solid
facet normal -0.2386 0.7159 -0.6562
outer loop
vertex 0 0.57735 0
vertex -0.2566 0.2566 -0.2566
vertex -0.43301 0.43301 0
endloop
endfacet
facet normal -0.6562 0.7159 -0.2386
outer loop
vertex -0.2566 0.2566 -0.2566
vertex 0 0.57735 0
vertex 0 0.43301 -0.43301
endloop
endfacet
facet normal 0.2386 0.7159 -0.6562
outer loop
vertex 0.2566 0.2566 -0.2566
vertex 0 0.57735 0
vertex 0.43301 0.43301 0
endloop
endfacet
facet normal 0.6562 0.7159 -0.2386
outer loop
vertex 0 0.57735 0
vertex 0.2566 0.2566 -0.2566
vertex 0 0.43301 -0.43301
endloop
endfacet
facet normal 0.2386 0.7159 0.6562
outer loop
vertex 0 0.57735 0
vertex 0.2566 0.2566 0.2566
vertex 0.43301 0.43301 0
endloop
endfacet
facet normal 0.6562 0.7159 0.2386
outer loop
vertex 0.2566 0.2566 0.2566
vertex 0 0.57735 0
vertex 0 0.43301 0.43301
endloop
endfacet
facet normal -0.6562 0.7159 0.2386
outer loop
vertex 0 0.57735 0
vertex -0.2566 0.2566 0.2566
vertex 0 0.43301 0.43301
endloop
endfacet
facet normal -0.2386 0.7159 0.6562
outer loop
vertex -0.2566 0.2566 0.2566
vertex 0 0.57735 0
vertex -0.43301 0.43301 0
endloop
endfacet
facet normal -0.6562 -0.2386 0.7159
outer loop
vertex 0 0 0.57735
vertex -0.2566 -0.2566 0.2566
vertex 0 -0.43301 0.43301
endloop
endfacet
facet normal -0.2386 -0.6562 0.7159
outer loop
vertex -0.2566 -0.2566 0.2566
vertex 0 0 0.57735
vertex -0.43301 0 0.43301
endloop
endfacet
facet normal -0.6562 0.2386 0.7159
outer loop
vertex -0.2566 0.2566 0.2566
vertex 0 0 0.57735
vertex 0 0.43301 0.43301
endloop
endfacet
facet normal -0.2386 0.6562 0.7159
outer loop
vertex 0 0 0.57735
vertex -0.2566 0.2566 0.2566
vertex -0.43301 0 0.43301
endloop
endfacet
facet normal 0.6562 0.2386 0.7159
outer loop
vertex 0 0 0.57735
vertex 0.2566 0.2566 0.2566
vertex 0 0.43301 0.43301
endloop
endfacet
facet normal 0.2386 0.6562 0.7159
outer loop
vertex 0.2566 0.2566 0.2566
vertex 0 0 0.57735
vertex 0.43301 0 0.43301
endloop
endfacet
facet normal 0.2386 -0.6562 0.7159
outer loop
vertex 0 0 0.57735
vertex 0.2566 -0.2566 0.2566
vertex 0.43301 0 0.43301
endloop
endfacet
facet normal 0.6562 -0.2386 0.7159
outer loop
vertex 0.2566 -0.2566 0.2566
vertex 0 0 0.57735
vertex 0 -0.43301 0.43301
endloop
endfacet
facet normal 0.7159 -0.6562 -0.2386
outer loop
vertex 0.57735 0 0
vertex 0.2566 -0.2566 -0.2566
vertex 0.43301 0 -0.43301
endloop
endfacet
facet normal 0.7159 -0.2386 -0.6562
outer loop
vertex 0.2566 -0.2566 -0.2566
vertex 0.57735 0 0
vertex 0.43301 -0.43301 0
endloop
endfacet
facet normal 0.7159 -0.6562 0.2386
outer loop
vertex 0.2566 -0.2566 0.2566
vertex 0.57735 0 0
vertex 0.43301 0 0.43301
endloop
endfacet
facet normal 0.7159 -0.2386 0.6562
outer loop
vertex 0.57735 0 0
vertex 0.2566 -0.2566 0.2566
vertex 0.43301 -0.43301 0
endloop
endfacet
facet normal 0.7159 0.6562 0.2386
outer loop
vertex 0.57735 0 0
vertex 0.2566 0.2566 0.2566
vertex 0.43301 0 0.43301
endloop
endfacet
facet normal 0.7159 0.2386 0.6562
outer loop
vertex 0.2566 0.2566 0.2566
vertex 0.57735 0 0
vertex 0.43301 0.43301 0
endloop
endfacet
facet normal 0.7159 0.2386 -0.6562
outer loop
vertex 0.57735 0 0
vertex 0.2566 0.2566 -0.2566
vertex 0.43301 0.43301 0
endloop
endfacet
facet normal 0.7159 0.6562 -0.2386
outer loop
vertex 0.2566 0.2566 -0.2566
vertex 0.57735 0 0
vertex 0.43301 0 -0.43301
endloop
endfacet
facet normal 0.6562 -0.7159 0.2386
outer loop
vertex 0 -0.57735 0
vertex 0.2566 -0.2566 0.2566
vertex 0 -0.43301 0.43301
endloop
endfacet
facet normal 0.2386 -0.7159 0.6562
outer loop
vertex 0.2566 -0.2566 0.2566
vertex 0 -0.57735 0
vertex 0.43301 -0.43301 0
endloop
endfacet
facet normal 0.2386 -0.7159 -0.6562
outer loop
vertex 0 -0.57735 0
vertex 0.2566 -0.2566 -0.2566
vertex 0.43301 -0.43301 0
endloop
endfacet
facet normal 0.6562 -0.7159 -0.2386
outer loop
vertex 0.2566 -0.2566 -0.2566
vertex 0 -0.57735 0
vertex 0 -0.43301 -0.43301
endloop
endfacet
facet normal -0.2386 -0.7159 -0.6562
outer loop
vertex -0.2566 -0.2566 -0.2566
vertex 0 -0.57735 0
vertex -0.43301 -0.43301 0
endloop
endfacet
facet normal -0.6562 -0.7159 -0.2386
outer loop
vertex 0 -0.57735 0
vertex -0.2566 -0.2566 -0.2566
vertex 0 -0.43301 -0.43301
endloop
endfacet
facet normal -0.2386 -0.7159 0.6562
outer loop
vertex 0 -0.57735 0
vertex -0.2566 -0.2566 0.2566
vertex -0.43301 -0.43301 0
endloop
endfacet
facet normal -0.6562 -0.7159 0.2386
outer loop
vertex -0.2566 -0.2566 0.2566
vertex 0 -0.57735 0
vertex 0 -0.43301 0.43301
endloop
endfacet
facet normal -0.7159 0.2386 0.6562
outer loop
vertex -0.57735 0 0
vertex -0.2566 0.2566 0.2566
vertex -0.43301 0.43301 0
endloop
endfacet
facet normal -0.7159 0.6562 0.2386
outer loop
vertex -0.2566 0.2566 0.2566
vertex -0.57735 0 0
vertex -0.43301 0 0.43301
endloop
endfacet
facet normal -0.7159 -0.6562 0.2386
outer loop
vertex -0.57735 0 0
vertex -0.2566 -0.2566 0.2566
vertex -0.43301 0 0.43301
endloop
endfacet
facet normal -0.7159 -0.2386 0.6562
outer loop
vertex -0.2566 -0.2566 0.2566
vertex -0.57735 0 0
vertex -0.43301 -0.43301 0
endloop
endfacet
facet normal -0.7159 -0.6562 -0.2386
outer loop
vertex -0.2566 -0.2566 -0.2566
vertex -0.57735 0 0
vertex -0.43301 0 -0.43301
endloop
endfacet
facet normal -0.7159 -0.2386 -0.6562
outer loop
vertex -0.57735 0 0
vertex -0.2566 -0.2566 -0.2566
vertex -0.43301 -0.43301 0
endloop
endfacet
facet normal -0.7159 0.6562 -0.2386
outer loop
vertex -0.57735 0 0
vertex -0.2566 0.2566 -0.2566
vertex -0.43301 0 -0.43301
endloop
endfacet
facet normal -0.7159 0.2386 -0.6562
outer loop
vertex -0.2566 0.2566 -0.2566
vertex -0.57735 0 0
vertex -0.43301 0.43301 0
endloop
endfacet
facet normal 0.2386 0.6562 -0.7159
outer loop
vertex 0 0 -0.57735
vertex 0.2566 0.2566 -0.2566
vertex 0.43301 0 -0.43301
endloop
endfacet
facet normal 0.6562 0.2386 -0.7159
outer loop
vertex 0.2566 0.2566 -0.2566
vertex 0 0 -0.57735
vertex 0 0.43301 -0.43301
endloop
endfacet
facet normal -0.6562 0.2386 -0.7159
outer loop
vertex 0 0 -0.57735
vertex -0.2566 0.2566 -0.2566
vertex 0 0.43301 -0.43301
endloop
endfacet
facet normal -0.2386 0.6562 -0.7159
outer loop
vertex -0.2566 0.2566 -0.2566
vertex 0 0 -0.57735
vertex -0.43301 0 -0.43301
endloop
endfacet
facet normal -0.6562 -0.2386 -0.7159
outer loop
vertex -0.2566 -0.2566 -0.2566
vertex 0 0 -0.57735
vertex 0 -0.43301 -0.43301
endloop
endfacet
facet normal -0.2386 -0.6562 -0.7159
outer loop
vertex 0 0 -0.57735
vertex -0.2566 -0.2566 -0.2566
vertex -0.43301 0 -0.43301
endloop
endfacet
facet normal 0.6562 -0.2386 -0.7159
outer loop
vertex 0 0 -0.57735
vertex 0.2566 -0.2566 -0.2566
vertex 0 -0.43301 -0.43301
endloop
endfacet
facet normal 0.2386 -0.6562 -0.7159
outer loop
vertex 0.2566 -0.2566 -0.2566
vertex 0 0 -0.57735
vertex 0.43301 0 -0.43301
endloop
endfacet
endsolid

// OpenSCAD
function C() = 
   p_resize(poly(name= "C",
       vertices= [
[ 0.5,  0.5,  0.5],
[ 0.5,  0.5, -0.5],
[ 0.5, -0.5,  0.5],
[ 0.5, -0.5, -0.5],
[-0.5,  0.5,  0.5],
[-0.5,  0.5, -0.5],
[-0.5, -0.5,  0.5],
[-0.5, -0.5, -0.5]],
      faces=
 [
[ 4 , 5, 1, 0],
[ 2 , 6, 4, 0],
[ 1 , 3, 2, 0],
[ 6 , 2, 3, 7],
[ 5 , 4, 6, 7],
[ 3 , 1, 5, 7]]
   ));
       
function flatten(l) = [ for (a = l) for (b = a) b ] ;
function reverse(l) = 
     [for (i=[1:len(l)]) l[len(l)-i]];
function vadd(points,v,i=0) =
      i < len(points)
        ?  concat([points[i] + v], vadd(points,v,i+1))
        :  [];
//
function vsum(points,i=0) =  
      i < len(points)
        ?  (points[i] + vsum(points,i+1))
        :  [0,0,0];
function ssum(list,i=0) =  
      i < len(list)
        ?  (list[i] + ssum(list,i+1))
        :  0;
//
function vcontains(val,list) =
     search([val],list)[0] != [];
function as_points(indexes,points) =
    [for (i=[0:len(indexes)-1])
          points[indexes[i]]
    ]; 
//
function centroid(points) = 
      vsum(points) / len(points);
//    
function vnorm(points) =
     [for (p=points) norm(p)];
//      
function average_norm(points) =
       ssum(vnorm(points)) / len(points);
function vertex_faces(v,faces) =   // return the faces containing v
     [ for (f=faces) if(v!=[] && search(v,f)) f ];
//    
//function ordered_vertex_faces(v,vfaces,cface=[],k=0)  =
//   k==0
//       ? let (nface=vfaces[0])
//           concat([nface],ordered_vertex_faces(v,vfaces,nface,k+1))
//       : k < len(vfaces)
//           ?  let(i = index_of(v,cface))
//              let(j= (i-1+len(cface))%len(cface))
//              let(edge=[v,cface[j]])
//              let(nface=face_with_edge(edge,vfaces))
//                 concat([nface],ordered_vertex_faces(v,vfaces,nface,k+1 ))  
//           : []
//;       
//      
//function ordered_vertex_edges(v,vfaces,face,k=0)  =
//   let(cface=(k==0)? vfaces[0] : face)
//   k < len(vfaces)
//           ?  let(i = index_of(v,cface))
//              let(j= (i-1+len(cface))%len(cface))
//              let(edge=[v,cface[j]])
//              let(nface=face_with_edge(edge,vfaces))
//                 concat([edge],ordered_vertex_edges(v,vfaces,nface,k+1 ))  
//           : []
//;     
//     
function vertex_edges(v,edges) = // return the ordered edges containing v
      [for (e = edges) if(e[0]==v || e[1]==v) e];
//                       
//// edge functions
//          
function distinct_edge(e) = 
     e[0]< e[1]
           ? e
           : reverse(e);
//          
function ordered_face_edges(f) =
 // edges are ordered anticlockwise
    [for (j=[0:len(f)-1])
        [f[j],f[(j+1)%len(f)]]
    ];
//
//function all_edges(faces) =
//   [for (f = faces)
//       for (j=[0:len(f)-1])
//          let(p=f[j],q=f[(j+1)%len(f)])
//             [p,q] 
//   ];
//
function distinct_face_edges(f) =
    [for (j=[0:len(f)-1])
       let(p=f[j],q=f[(j+1)%len(f)])
          distinct_edge([p,q])
    ];
//    
function distinct_edges(faces) =
   [for (f = faces)
       for (j=[0:len(f)-1])
          let(p=f[j],q=f[(j+1)%len(f)])
             if(p<q) [p,q]  // no duplicates
   ];
      
//function check_euler(obj) =
//     //  E = V + F -2    
//    len(p_vertices(obj)) + len(p_faces(obj)) - 2
//           ==  len(distinct_edges(obj[2]));
//
//function edge_length(edge,points) =    
//    let (points = as_points(edge,points))
//    norm(points[0]-points[1]) ;
//             
//function edge_lengths(edges,points) =
//   [ for (edge = edges) 
//     edge_length(edge,points)
//   ];
// 
//function tangent(v1,v2) =
//   let (d=v2-v1)
//   v1 - d * (d*v1)/(d*d);
// 
//function edge_distance(v1,v2) = norm(tangent(v1,v2));
// 
function face_with_edge(edge,faces) =
     flatten(
        [for (f = faces) 
           if (vcontains(edge,ordered_face_edges(f)))
            f
        ]);
//           
//function dihedral_angle(edge,faces,points)=
//    let(f0 = face_with_edge(edge,faces),
//        f1 = face_with_edge(reverse(edge),faces)
//        )
//    let(angle = 
//           angle_between(
//               normal(as_points(f0,points)),
//               normal(as_points(f1,points))))
//    180-angle;     
//
//function dihedral_angle_faces(f0,f1,faces,points)=
//    let(angle = 
//           angle_between(
//               normal(as_points(faces[f0],points)),
//               normal(as_points(faces[f1],points))))
//    180-angle; 
//           
////face functions
//function selected_face(face,fn) = 
//     fn == [] || search(len(face),fn) != [] ;
//
//function orthogonal(v0,v1,v2) =  cross(v1-v0,v2-v1);
//
//function normal(face) =
//     let (n=orthogonal(face[0],face[1],face[2]))
//     - n / norm(n);
//
//function triangle(a,b) = norm(cross(a,b))/2;
//
//function face_area(face) =
//     ssum([for (i=[0:len(face)-1])
//           triangle(face[i], face[(i+1)%len(face)]) ]);
//     
//function face_areas(obj) =
//   [for (f=p_faces(obj))
//       let(face_points = as_points(f,p_vertices(obj)))
//       let(centroid=centroid(face_points))
//          face_area(vadd(face_points,-centroid))
//   ];
//
//function face_areas_index(obj) =
//   [for (face=p_faces(obj))
//       let(face_points = as_points(face,p_vertices(obj)))
//       let(centroid=centroid(face_points))
//          [face,face_area(vadd(face_points,-centroid))]
//   ];
//
//function max_area(areas, max=[undef,0], i=0) =
//   i <len(areas)
//      ? areas[i][1] > max[1]
//         ?  max_area(areas,areas[i],i+1)
//         :  max_area(areas,max,i+1)
//      : max[0];
//
//function average_face_normal(fp) =
//     let(fl=len(fp))
//     let(normals=
//           [for(i=[0:fl-1])
//            orthogonal(fp[i],fp[(i+1)%fl],fp[(i+2)%fl])
//           ]
//          )
//     vsum(normals)/len(normals);
//    
//function average_normal(fp) =
//     let(fl=len(fp))
//     let(unitns=
//           [for(i=[0:fl-1])
//            let(n=orthogonal(fp[i],fp[(i+1)%fl],fp[(i+2)%fl]))
//            let(normn=norm(n))
//              normn==0 ? [] : n/normn
//           ]
//          )
//     vsum(unitns)/len(unitns);
//     
//function average_edge_distance(fp) =
//     let(fl=len(fp))
//     ssum( [for (i=[0:fl-1])
//                edge_distance(fp[i],fp[(i+1)%fl])
//             ])/ fl;
//    
//function face_sides(faces) =
//    [for (f=faces) len(f)];
//        
//function face_coplanarity(face) =
//       norm(cross(cross(face[1]-face[0],face[2]-face[1]),
//                  cross(face[2]-face[1],face[3]-face[2])
//            ));
//
//
//function face_edges(face,points) =
//     [for (edge=ordered_face_edges(face)) 
//           edge_length(edge,points)
//     ];
//         
//function min_edge_length(face,points) =
//    min(face_edges(face,points));
//   
//function face_irregularity(face,points) =
//    let (lengths=face_edges(face,points))
//    max(lengths)/ min(lengths);
//
//function face_analysis(faces) =
//  let (edge_counts=face_sides(faces))
//  [for (sides=distinct(edge_counts))
//        [sides,count(sides,edge_counts)]
//   ];
//
//function vertex_face_list(vertices,faces) =
//    [for (i=[0:len(vertices)-1])
//     let (vf= vertex_faces(i,faces))
//     len(vf)];
//    
//function vertex_analysis(vertices,faces) =
//  let (face_counts=vertex_face_list(vertices,faces))
//  [for (vo = distinct(face_counts))
//        [vo,count(vo,face_counts)]
//   ];
//// ensure that all faces have a lhs orientation
//function cosine_between(u, v) =(u * v) / (norm(u) * norm(v));
//
//function lhs_faces(faces,vertices) =
//    [for (face = faces)
//     let(points = as_points(face,vertices))
//        cosine_between(normal(points), centroid(points)) < 0
//        ?  reverse(face)  :  face
//    ];
//  
//// poly functions
////  constructor
function poly(name,vertices,faces,debug=[],partial=false) = 
    [name,vertices,faces,debug,partial];
//    
//// accessors
function p_name(obj) = obj[0];
function p_vertices(obj) = obj[1];
function p_faces(obj) = obj[2];
//function p_debug(obj)=obj[3];
function p_partial(obj)=obj[4];
function p_edges(obj) = 
       p_partial(obj)
           ? all_edges(p_faces(obj))
           : distinct_edges(p_faces(obj));
function p_faces_as_points(obj) =
    [for (f = p_faces(obj))
        as_points(f,p_vertices(obj))
    ];
//    
module p_render(obj,show_vertices=false,show_edges=false,show_faces=true, rv=0.04, re=0.02) {
     if(show_faces) 
          polyhedron(p_vertices(obj),p_faces(obj),convexity=10);
     if(show_vertices) 
         show_points(p_vertices(obj),rv);
     if(show_edges)
       show_edges(p_edges(obj),p_vertices(obj),re);
};
function centroid_points(points) = 
     vadd(points, - centroid(points));
function p_circumscribed_resize(obj,radius=1) =
    let(pv=centroid_points(p_vertices(obj)))
    let(average=average_norm(pv))
    poly(name=p_name(obj),
         vertices=pv * radius /average,
         faces=p_faces(obj),
         debug=average
    );
// 
function p_resize(obj,radius=1) =
    p_circumscribed_resize(obj,radius);
//
//// canonicalization
//// Conway operators 
///*  where necessary, new vertices are first created and stored in an associative array, keyed by whatever is appropriate to identify the new vertex - this could be an old vertex id, a face, an edge or something more complicated.  This array is then used to create an associative array of key and vertex ids for use in face construction, and to generate the new vertices themselves. 
//*/
//
function vertex_ids(entries,offset=0,i=0) = 
// to get position of new vertices 
    len(entries) > 0
          ?[for (i=[0:len(entries)-1]) 
             [entries[i][0] ,i+offset]
           ]
          :[]
          ;
//   
function vertex_values(entries)= 
    [for (e = entries) e[1]];
// 
function vertex(key,entries) =   // key is an array 
    entries[search([key],entries)[0]][1];
//    
function cc(obj) =
// Catmull-Clark smoothing
// each face is replaced with n quadralaterals based on edge midpoints vertices and centroid
// edge midpoints are average of edge endpoints and adjacent centroids
// original vertices replaced by weighted average of original vertex, face centroids and edge midpoints

    let(pe=p_edges(obj),
        pf=p_faces(obj),
        pv=p_vertices(obj))
    let (newfv =
           [for (face = pf)               // new centroid vertices
            let (fp=as_points(face,pv))
             [face,centroid(fp)]                                
           ])
    let (newev =                          // new edge 'midpoints'
           [for (edge=pe)
            let (ep = as_points(edge,pv),
                 af1 = face_with_edge(edge,pf),
                 af2 = face_with_edge(reverse(edge),pf),
                 fc1 = vertex(af1, newfv),
                 fc2 = vertex(af2, newfv))
             [edge,(ep[0]+ep[1]+fc1+fc2)/4]
           ])
     let(newfvids=vertex_ids(newfv,len(pv)))
     let(newevids=vertex_ids(newev,len(pv)+len(newfv)))
         
     let(newf =
          flatten(
          [for (face=pf) 
             let(centroid=vertex(face,newfvids))  
             flatten(
              [for (j=[0:len(face)-1])    //  
               let (a=face[j],
                    b=face[(j+1)%len(face)],
                    c=face[(j+2)%len(face)],
                    mid1=vertex(distinct_edge([a,b]),newevids),
                    mid2=vertex(distinct_edge([b,c]),newevids)         
              )
                   [[ centroid, mid1,b,mid2]]
              ])
           ]))   
     let(newv =                       // revised original vertices 
         [ for (i = [0:len(pv)-1])
           let (v = pv[i],
                vf = [for (face = vertex_faces(i,pf)) vertex(face,newfv)],
                F = centroid(vf),
                R = centroid([for (edge = vertex_edges(i,pe)) vertex(edge,newev)]),
                n = len(vf))
           ( F + 2* R + (n  - 3 )* v ) / n
         ])         
     poly(name=str("v",p_name(obj)),
          vertices= concat(newv,vertex_values(newfv),vertex_values(newev)),                
          faces=newf
      ) 
 ; //end cc
//
//function rcc(s,n=0) =
//// multilevel Catmull-Clark
//    n == 0
//         ? s
//         : rcc(cc(s),n-1)
//;            
//                                 
//function place(obj,face_i) =
//// on largest face for printing
//   let (face= face_i == undef ? max_area(face_areas_index(obj)) : p_faces(obj)[face_i])
//   let (points =as_points(face,p_vertices(obj)))
//   let (n = normal(points), c=centroid(points))
//   let (m=m_from(c,-n))
//   transform(obj,m)
//;
//
//function orient(obj) =
//// ensure faces have lhs order
//    poly(name=str("O",p_name(obj)),
//         vertices= p_vertices(obj),
//         faces = lhs_faces(p_faces(obj),p_vertices(obj))
//    );
// 
//function invert(obj,p) =
//// invert vertices 
//    poly(name=str("I",p_name(obj)),
//         vertices= 
//            [ for (v =p_vertices(obj))
//              let (n=norm(v))
//              v /  pow(n,p)  
//            ],
//         faces = p_faces(obj)
//    );
//
//function shell(obj,outer_inset_ratio=0.2, outer_inset, inner_inset_ratio, inner_inset,thickness=0.2,fn=[],min_edge_length=0.01,nocut=0) = 
//// upper and lower inset can be specified by ratio or absolute distance
//   let(inner_inset_ratio= inner_inset_ratio == undef ? outer_inset_ratio : inner_inset_ratio,
//       pf=p_faces(obj),           
//       pv=p_vertices(obj))
//   let(inv=   // corresponding points on inner surface
//       [for (i =[0:len(pv)-1])
//        let(v = pv[i])
//        let(norms =
//            [for (f=vertex_faces(i,pf))
//             let (fp=as_points(f,pv))
//                normal(fp)
//            ])
//        let(av_norm = -vsum(norms)/len(norms))
//            v + thickness*unitv(av_norm)
//        ])
//                 
//   let (newv =   
// // the inset points on outer and inner surfaces
// // outer inset points keyed by face, v, inner points by face,-v-1
//         flatten(
//           [ for (face = pf)
//             if(selected_face(face,fn)
//                && min_edge_length(face,pv) > min_edge_length)
//                 let(fp=as_points(face,pv),
//                     ofp=as_points(face,inv),
//                     c=centroid(fp),
//                     oc=centroid(ofp))
//                 flatten(
//                    [for (i=[0:len(face)-1])
//                     let(v=face[i],
//                         p = fp[i],
//                         p1= fp[(i+1)%len(face)],
//                         p0=fp[(i-1 + len(face))%len(face)],
//                         sa = angle_between(p0-p,p1-p),
//                         bv = (unitv(p1-p)+unitv(p0-p))/2,
//                         op= ofp[i],
//                         ip = outer_inset ==  undef 
//                             ? p + (c-p)*outer_inset_ratio 
//                             : p + outer_inset/sin(sa) * bv ,
//                         oip = inner_inset == undef 
//                             ? op + (oc-op)*inner_inset_ratio 
//                             : op + inner_inset/sin(sa) * bv)
//                     [ [[face,v],ip],[[face,-v-1],oip]]
//                    ])
//             ])          
//           )
//   let(newids=vertex_ids(newv,2*len(pv)))
//   let(newf =
//         flatten(
//          [ for (i = [0:len(pf)-1])   
//            let(face = pf[i])
//            flatten(
//              selected_face(face,fn)
//                && min_edge_length(face,pv) > min_edge_length
//                && i  >= nocut    
//              
//                ? [for (j=[0:len(face)-1])   //  replace N-face with 3*N quads 
//                  let (a=face[j],
//                       inseta = vertex([face,a],newids),
//                       oinseta= vertex([face,-a-1],newids),
//                       b=face[(j+1)%len(face)],
//                       insetb= vertex([face,b],newids),
//                       oinsetb=vertex([face,-b-1],newids),
//                       oa=len(pv) + a,
//                       ob=len(pv) + b) 
//                  
//                     [
//                       [a,b,insetb,inseta]  // outer face
//                      ,[inseta,insetb,oinsetb,oinseta]  //wall
//                      ,[oa,oinseta,oinsetb,ob]  // inner face
//                     ] 
//                   ] 
//                :  [[face],  //outer face
//                    [reverse([  //inner face
//                           for (j=[0:len(face)-1])
//                           len(pv) +face[j]
//                         ])
//                    ]
//                   ]    
//               )
//         ] ))    
//                           
//   poly(name=str("S",p_name(obj)),
//       vertices=  concat(pv, inv, vertex_values(newv)) ,    
//       faces= newf,
//       debug=newv       
//       )
//; // end shell  
//

//   
//
//// modulation  
//                           
//function modulate_points(points) =
//   [for(p=points)
//       let(s=xyz_to_spherical(p),
//           fs=fmod(s[0],s[1],s[2]))
//       spherical_to_xyz(fs[0],fs[1],fs[2])
//   ];
//
//function xyz_to_spherical(p) =
//    [ norm(p), acos(p.z/ norm(p)), atan2(p.x,p.y)] ;
//
//function spherical_to_xyz(r,theta,phi) =
//    [ r * sin(theta) * cos(phi),
//      r * sin(theta) * sin(phi),
//      r * cos(theta)];
//
//function fstar(r,theta,phi)=
//      [r*(1.0 + 0.5*pow((cos(3*phi)),2)), theta ,phi];  
//   
//function fegg(r,theta,phi) = 
//     [r*(1.0+ 0.5*pow(1.1*(cos(1*theta)),3)), theta,phi];
//
//function fberry(r,theta,phi) =
//     [r*(1.0 - 0.5*pow(0.8*(cos(theta+60)),2)),theta,phi];       
//
//function fcushion(r,theta,phi) =
//     [r*(1.0 - 0.5*pow(0.9*cos(theta),2)), theta, phi];
//          
//function fbauble(r,theta,phi) = 
//     [r*(1- 0.5*sin(theta*2) + 0.1* sin(theta)*sqrt(abs(cos(theta*2))))
//          / (sin(theta)), theta,phi] ;
//
//function fellipsoid(r,theta,phi,e) = [r*(1.0+pow(e*cos(theta),2)),theta,phi] ;
//  
//function fsuperegg(r,theta,phi,n,e=1) =
//       [ r* (pow(
//               pow(abs(cos(theta)),n) 
//           + e*pow(abs(sin(theta)),n)
//            ,-1/n))
//         ,theta,phi];
//         
//function fsupersuperegg(r,theta,phi,nt,et=1,np=2,ep=1) =
//       [ r* (pow(
//               pow(abs(cos(theta)),nt) 
//           + et*pow(abs(sin(theta)),nt)
//            ,-1/nt))
//            
//         * (pow(
//               pow(abs(cos(phi)),np) 
//           + ep*pow(abs(sin(phi)),np)
//            ,-1/np))
//         ,theta,phi];
// 
//function modulate(obj) =
//    poly(name=str("S",p_name(obj)),
//         vertices=modulate_points(p_vertices(obj)),         
//         faces= 
//          [ for (face =p_faces(obj))
//              reverse(face)
//          ]
//    )
//;  // end modulate
//
//// object trimming
//
//module ground(z=200) {
//   translate([0,0,-z]) cube(z*2,center=true);
//} 
//
//module sky(z=200) {
//   rotate([0,180,0]) ground(z);
//}
//
///*
////  superegg_tktI  - Goldberg (3,3)  
//function fmod(r,theta,phi) = fsuperegg(r,theta,phi,2.5,1.3333);
//s= modulate(plane(trunc(plane(kis(trunc(I()))))));
//echo(p_description(s));                    
//t=shell(s,thickness=0.15,outer_inset_ratio=0.35,inner_inset_ratio=0.2,fn=[6]);              
//scale(20)  p_render(t,false,false,true);
//
//*/
//
///*
//s=shell(plane(trunc(plane(kis(plane(trunc(D())), fn=[10])), fn=[10])));
//// s=trunc(plane(kis(T)),fn=[3]);
//p_describe(s);
//scale(10) p_render(s,false,false,true);
//*/
//
///*
//s=place(canon(plane(propellor(D()),10),10));
//p_describe(s);
//scale(20) p_render(shell(s,outer_inset=0.15,fn=[],thickness=0.2));
//
//*/
//
///*
//s=plane(whirl(plane(trunc(I()))));
//p_print(s);
//scale(10) p_render(shell(s,fn=[6]),false,false,true);
//
//
//*/
///*
//s=transform(plane(chamfer(plane(chamfer(D())))),m_translate([0,0,0.3])*m_scale([1,1.5,2]));
//t=shell(s,fn=[0]);
//p_print(t);
//scale(20) difference() {
//    translate([0,0,-0.5]) p_render(t,false,false,true,re=0.08,rv=0.08);
//    ground();
//}
//*/
///*
//rd = plane(join(C())); // rhombic dodecahedron
//di = plane(ortho(C())); // deltoid icositetrahedron
//c=C();
//p_print(rd);
//p_print(di);
//intersection() {
//color("green") scale(30) rotate([0,45,0]) p_render(rd);
//color("red") scale(31) p_render(di);
//color("yellow") scale(60) p_render(c);
//}
//
//*/
///*
//r=0.8;
//scale(20)
//intersection() {
//  p_render(C());
//  scale(r) p_render(plane(meta(C())));  
//
//}
//*/
///*
//intersection(){
//   color("red") scale([0.8,0.8,3]) p_render(C());
//   color("green") rotate([0,0,45]) scale([2,2,1.2])  p_render(O());
//   color("blue") rotate([0,0,45]) scale([1.1,1.1,1.8])  p_render(O());
//}
//*/
//
///*
//// http://www.smorf.nl/index.php?crystal=Moschellandsbergite_D1
//
//r1=0.65;
//r2=0.6;
//r3=0.55;
//scale(20)
//intersection() {
// color("red")   scale(r1) p_render(C());
// color("green") scale(r2) p_render(plane(join(C())));  
// color("blue")  scale(r3) p_render(plane(ortho(C())));  
//}
//*/
//      
//k=0.4;
//$fn=20;
//// scale(20) p_render_text(place(O()),["1","2","3","4","5","6","7","8"],"Georgia",0.8,4,0.06);
//// s=plane(cc(kis(C(),height=0.5)));
////s=plane(ortho(C()));
s=cc(C());
//// s=cc(cc(cc(shell(C()))));
//s=rcc(inset_kis(C(),height=1),3);
//p_print(s);
p_render(s,show_edges=false,show_faces=true,re=0.02);
